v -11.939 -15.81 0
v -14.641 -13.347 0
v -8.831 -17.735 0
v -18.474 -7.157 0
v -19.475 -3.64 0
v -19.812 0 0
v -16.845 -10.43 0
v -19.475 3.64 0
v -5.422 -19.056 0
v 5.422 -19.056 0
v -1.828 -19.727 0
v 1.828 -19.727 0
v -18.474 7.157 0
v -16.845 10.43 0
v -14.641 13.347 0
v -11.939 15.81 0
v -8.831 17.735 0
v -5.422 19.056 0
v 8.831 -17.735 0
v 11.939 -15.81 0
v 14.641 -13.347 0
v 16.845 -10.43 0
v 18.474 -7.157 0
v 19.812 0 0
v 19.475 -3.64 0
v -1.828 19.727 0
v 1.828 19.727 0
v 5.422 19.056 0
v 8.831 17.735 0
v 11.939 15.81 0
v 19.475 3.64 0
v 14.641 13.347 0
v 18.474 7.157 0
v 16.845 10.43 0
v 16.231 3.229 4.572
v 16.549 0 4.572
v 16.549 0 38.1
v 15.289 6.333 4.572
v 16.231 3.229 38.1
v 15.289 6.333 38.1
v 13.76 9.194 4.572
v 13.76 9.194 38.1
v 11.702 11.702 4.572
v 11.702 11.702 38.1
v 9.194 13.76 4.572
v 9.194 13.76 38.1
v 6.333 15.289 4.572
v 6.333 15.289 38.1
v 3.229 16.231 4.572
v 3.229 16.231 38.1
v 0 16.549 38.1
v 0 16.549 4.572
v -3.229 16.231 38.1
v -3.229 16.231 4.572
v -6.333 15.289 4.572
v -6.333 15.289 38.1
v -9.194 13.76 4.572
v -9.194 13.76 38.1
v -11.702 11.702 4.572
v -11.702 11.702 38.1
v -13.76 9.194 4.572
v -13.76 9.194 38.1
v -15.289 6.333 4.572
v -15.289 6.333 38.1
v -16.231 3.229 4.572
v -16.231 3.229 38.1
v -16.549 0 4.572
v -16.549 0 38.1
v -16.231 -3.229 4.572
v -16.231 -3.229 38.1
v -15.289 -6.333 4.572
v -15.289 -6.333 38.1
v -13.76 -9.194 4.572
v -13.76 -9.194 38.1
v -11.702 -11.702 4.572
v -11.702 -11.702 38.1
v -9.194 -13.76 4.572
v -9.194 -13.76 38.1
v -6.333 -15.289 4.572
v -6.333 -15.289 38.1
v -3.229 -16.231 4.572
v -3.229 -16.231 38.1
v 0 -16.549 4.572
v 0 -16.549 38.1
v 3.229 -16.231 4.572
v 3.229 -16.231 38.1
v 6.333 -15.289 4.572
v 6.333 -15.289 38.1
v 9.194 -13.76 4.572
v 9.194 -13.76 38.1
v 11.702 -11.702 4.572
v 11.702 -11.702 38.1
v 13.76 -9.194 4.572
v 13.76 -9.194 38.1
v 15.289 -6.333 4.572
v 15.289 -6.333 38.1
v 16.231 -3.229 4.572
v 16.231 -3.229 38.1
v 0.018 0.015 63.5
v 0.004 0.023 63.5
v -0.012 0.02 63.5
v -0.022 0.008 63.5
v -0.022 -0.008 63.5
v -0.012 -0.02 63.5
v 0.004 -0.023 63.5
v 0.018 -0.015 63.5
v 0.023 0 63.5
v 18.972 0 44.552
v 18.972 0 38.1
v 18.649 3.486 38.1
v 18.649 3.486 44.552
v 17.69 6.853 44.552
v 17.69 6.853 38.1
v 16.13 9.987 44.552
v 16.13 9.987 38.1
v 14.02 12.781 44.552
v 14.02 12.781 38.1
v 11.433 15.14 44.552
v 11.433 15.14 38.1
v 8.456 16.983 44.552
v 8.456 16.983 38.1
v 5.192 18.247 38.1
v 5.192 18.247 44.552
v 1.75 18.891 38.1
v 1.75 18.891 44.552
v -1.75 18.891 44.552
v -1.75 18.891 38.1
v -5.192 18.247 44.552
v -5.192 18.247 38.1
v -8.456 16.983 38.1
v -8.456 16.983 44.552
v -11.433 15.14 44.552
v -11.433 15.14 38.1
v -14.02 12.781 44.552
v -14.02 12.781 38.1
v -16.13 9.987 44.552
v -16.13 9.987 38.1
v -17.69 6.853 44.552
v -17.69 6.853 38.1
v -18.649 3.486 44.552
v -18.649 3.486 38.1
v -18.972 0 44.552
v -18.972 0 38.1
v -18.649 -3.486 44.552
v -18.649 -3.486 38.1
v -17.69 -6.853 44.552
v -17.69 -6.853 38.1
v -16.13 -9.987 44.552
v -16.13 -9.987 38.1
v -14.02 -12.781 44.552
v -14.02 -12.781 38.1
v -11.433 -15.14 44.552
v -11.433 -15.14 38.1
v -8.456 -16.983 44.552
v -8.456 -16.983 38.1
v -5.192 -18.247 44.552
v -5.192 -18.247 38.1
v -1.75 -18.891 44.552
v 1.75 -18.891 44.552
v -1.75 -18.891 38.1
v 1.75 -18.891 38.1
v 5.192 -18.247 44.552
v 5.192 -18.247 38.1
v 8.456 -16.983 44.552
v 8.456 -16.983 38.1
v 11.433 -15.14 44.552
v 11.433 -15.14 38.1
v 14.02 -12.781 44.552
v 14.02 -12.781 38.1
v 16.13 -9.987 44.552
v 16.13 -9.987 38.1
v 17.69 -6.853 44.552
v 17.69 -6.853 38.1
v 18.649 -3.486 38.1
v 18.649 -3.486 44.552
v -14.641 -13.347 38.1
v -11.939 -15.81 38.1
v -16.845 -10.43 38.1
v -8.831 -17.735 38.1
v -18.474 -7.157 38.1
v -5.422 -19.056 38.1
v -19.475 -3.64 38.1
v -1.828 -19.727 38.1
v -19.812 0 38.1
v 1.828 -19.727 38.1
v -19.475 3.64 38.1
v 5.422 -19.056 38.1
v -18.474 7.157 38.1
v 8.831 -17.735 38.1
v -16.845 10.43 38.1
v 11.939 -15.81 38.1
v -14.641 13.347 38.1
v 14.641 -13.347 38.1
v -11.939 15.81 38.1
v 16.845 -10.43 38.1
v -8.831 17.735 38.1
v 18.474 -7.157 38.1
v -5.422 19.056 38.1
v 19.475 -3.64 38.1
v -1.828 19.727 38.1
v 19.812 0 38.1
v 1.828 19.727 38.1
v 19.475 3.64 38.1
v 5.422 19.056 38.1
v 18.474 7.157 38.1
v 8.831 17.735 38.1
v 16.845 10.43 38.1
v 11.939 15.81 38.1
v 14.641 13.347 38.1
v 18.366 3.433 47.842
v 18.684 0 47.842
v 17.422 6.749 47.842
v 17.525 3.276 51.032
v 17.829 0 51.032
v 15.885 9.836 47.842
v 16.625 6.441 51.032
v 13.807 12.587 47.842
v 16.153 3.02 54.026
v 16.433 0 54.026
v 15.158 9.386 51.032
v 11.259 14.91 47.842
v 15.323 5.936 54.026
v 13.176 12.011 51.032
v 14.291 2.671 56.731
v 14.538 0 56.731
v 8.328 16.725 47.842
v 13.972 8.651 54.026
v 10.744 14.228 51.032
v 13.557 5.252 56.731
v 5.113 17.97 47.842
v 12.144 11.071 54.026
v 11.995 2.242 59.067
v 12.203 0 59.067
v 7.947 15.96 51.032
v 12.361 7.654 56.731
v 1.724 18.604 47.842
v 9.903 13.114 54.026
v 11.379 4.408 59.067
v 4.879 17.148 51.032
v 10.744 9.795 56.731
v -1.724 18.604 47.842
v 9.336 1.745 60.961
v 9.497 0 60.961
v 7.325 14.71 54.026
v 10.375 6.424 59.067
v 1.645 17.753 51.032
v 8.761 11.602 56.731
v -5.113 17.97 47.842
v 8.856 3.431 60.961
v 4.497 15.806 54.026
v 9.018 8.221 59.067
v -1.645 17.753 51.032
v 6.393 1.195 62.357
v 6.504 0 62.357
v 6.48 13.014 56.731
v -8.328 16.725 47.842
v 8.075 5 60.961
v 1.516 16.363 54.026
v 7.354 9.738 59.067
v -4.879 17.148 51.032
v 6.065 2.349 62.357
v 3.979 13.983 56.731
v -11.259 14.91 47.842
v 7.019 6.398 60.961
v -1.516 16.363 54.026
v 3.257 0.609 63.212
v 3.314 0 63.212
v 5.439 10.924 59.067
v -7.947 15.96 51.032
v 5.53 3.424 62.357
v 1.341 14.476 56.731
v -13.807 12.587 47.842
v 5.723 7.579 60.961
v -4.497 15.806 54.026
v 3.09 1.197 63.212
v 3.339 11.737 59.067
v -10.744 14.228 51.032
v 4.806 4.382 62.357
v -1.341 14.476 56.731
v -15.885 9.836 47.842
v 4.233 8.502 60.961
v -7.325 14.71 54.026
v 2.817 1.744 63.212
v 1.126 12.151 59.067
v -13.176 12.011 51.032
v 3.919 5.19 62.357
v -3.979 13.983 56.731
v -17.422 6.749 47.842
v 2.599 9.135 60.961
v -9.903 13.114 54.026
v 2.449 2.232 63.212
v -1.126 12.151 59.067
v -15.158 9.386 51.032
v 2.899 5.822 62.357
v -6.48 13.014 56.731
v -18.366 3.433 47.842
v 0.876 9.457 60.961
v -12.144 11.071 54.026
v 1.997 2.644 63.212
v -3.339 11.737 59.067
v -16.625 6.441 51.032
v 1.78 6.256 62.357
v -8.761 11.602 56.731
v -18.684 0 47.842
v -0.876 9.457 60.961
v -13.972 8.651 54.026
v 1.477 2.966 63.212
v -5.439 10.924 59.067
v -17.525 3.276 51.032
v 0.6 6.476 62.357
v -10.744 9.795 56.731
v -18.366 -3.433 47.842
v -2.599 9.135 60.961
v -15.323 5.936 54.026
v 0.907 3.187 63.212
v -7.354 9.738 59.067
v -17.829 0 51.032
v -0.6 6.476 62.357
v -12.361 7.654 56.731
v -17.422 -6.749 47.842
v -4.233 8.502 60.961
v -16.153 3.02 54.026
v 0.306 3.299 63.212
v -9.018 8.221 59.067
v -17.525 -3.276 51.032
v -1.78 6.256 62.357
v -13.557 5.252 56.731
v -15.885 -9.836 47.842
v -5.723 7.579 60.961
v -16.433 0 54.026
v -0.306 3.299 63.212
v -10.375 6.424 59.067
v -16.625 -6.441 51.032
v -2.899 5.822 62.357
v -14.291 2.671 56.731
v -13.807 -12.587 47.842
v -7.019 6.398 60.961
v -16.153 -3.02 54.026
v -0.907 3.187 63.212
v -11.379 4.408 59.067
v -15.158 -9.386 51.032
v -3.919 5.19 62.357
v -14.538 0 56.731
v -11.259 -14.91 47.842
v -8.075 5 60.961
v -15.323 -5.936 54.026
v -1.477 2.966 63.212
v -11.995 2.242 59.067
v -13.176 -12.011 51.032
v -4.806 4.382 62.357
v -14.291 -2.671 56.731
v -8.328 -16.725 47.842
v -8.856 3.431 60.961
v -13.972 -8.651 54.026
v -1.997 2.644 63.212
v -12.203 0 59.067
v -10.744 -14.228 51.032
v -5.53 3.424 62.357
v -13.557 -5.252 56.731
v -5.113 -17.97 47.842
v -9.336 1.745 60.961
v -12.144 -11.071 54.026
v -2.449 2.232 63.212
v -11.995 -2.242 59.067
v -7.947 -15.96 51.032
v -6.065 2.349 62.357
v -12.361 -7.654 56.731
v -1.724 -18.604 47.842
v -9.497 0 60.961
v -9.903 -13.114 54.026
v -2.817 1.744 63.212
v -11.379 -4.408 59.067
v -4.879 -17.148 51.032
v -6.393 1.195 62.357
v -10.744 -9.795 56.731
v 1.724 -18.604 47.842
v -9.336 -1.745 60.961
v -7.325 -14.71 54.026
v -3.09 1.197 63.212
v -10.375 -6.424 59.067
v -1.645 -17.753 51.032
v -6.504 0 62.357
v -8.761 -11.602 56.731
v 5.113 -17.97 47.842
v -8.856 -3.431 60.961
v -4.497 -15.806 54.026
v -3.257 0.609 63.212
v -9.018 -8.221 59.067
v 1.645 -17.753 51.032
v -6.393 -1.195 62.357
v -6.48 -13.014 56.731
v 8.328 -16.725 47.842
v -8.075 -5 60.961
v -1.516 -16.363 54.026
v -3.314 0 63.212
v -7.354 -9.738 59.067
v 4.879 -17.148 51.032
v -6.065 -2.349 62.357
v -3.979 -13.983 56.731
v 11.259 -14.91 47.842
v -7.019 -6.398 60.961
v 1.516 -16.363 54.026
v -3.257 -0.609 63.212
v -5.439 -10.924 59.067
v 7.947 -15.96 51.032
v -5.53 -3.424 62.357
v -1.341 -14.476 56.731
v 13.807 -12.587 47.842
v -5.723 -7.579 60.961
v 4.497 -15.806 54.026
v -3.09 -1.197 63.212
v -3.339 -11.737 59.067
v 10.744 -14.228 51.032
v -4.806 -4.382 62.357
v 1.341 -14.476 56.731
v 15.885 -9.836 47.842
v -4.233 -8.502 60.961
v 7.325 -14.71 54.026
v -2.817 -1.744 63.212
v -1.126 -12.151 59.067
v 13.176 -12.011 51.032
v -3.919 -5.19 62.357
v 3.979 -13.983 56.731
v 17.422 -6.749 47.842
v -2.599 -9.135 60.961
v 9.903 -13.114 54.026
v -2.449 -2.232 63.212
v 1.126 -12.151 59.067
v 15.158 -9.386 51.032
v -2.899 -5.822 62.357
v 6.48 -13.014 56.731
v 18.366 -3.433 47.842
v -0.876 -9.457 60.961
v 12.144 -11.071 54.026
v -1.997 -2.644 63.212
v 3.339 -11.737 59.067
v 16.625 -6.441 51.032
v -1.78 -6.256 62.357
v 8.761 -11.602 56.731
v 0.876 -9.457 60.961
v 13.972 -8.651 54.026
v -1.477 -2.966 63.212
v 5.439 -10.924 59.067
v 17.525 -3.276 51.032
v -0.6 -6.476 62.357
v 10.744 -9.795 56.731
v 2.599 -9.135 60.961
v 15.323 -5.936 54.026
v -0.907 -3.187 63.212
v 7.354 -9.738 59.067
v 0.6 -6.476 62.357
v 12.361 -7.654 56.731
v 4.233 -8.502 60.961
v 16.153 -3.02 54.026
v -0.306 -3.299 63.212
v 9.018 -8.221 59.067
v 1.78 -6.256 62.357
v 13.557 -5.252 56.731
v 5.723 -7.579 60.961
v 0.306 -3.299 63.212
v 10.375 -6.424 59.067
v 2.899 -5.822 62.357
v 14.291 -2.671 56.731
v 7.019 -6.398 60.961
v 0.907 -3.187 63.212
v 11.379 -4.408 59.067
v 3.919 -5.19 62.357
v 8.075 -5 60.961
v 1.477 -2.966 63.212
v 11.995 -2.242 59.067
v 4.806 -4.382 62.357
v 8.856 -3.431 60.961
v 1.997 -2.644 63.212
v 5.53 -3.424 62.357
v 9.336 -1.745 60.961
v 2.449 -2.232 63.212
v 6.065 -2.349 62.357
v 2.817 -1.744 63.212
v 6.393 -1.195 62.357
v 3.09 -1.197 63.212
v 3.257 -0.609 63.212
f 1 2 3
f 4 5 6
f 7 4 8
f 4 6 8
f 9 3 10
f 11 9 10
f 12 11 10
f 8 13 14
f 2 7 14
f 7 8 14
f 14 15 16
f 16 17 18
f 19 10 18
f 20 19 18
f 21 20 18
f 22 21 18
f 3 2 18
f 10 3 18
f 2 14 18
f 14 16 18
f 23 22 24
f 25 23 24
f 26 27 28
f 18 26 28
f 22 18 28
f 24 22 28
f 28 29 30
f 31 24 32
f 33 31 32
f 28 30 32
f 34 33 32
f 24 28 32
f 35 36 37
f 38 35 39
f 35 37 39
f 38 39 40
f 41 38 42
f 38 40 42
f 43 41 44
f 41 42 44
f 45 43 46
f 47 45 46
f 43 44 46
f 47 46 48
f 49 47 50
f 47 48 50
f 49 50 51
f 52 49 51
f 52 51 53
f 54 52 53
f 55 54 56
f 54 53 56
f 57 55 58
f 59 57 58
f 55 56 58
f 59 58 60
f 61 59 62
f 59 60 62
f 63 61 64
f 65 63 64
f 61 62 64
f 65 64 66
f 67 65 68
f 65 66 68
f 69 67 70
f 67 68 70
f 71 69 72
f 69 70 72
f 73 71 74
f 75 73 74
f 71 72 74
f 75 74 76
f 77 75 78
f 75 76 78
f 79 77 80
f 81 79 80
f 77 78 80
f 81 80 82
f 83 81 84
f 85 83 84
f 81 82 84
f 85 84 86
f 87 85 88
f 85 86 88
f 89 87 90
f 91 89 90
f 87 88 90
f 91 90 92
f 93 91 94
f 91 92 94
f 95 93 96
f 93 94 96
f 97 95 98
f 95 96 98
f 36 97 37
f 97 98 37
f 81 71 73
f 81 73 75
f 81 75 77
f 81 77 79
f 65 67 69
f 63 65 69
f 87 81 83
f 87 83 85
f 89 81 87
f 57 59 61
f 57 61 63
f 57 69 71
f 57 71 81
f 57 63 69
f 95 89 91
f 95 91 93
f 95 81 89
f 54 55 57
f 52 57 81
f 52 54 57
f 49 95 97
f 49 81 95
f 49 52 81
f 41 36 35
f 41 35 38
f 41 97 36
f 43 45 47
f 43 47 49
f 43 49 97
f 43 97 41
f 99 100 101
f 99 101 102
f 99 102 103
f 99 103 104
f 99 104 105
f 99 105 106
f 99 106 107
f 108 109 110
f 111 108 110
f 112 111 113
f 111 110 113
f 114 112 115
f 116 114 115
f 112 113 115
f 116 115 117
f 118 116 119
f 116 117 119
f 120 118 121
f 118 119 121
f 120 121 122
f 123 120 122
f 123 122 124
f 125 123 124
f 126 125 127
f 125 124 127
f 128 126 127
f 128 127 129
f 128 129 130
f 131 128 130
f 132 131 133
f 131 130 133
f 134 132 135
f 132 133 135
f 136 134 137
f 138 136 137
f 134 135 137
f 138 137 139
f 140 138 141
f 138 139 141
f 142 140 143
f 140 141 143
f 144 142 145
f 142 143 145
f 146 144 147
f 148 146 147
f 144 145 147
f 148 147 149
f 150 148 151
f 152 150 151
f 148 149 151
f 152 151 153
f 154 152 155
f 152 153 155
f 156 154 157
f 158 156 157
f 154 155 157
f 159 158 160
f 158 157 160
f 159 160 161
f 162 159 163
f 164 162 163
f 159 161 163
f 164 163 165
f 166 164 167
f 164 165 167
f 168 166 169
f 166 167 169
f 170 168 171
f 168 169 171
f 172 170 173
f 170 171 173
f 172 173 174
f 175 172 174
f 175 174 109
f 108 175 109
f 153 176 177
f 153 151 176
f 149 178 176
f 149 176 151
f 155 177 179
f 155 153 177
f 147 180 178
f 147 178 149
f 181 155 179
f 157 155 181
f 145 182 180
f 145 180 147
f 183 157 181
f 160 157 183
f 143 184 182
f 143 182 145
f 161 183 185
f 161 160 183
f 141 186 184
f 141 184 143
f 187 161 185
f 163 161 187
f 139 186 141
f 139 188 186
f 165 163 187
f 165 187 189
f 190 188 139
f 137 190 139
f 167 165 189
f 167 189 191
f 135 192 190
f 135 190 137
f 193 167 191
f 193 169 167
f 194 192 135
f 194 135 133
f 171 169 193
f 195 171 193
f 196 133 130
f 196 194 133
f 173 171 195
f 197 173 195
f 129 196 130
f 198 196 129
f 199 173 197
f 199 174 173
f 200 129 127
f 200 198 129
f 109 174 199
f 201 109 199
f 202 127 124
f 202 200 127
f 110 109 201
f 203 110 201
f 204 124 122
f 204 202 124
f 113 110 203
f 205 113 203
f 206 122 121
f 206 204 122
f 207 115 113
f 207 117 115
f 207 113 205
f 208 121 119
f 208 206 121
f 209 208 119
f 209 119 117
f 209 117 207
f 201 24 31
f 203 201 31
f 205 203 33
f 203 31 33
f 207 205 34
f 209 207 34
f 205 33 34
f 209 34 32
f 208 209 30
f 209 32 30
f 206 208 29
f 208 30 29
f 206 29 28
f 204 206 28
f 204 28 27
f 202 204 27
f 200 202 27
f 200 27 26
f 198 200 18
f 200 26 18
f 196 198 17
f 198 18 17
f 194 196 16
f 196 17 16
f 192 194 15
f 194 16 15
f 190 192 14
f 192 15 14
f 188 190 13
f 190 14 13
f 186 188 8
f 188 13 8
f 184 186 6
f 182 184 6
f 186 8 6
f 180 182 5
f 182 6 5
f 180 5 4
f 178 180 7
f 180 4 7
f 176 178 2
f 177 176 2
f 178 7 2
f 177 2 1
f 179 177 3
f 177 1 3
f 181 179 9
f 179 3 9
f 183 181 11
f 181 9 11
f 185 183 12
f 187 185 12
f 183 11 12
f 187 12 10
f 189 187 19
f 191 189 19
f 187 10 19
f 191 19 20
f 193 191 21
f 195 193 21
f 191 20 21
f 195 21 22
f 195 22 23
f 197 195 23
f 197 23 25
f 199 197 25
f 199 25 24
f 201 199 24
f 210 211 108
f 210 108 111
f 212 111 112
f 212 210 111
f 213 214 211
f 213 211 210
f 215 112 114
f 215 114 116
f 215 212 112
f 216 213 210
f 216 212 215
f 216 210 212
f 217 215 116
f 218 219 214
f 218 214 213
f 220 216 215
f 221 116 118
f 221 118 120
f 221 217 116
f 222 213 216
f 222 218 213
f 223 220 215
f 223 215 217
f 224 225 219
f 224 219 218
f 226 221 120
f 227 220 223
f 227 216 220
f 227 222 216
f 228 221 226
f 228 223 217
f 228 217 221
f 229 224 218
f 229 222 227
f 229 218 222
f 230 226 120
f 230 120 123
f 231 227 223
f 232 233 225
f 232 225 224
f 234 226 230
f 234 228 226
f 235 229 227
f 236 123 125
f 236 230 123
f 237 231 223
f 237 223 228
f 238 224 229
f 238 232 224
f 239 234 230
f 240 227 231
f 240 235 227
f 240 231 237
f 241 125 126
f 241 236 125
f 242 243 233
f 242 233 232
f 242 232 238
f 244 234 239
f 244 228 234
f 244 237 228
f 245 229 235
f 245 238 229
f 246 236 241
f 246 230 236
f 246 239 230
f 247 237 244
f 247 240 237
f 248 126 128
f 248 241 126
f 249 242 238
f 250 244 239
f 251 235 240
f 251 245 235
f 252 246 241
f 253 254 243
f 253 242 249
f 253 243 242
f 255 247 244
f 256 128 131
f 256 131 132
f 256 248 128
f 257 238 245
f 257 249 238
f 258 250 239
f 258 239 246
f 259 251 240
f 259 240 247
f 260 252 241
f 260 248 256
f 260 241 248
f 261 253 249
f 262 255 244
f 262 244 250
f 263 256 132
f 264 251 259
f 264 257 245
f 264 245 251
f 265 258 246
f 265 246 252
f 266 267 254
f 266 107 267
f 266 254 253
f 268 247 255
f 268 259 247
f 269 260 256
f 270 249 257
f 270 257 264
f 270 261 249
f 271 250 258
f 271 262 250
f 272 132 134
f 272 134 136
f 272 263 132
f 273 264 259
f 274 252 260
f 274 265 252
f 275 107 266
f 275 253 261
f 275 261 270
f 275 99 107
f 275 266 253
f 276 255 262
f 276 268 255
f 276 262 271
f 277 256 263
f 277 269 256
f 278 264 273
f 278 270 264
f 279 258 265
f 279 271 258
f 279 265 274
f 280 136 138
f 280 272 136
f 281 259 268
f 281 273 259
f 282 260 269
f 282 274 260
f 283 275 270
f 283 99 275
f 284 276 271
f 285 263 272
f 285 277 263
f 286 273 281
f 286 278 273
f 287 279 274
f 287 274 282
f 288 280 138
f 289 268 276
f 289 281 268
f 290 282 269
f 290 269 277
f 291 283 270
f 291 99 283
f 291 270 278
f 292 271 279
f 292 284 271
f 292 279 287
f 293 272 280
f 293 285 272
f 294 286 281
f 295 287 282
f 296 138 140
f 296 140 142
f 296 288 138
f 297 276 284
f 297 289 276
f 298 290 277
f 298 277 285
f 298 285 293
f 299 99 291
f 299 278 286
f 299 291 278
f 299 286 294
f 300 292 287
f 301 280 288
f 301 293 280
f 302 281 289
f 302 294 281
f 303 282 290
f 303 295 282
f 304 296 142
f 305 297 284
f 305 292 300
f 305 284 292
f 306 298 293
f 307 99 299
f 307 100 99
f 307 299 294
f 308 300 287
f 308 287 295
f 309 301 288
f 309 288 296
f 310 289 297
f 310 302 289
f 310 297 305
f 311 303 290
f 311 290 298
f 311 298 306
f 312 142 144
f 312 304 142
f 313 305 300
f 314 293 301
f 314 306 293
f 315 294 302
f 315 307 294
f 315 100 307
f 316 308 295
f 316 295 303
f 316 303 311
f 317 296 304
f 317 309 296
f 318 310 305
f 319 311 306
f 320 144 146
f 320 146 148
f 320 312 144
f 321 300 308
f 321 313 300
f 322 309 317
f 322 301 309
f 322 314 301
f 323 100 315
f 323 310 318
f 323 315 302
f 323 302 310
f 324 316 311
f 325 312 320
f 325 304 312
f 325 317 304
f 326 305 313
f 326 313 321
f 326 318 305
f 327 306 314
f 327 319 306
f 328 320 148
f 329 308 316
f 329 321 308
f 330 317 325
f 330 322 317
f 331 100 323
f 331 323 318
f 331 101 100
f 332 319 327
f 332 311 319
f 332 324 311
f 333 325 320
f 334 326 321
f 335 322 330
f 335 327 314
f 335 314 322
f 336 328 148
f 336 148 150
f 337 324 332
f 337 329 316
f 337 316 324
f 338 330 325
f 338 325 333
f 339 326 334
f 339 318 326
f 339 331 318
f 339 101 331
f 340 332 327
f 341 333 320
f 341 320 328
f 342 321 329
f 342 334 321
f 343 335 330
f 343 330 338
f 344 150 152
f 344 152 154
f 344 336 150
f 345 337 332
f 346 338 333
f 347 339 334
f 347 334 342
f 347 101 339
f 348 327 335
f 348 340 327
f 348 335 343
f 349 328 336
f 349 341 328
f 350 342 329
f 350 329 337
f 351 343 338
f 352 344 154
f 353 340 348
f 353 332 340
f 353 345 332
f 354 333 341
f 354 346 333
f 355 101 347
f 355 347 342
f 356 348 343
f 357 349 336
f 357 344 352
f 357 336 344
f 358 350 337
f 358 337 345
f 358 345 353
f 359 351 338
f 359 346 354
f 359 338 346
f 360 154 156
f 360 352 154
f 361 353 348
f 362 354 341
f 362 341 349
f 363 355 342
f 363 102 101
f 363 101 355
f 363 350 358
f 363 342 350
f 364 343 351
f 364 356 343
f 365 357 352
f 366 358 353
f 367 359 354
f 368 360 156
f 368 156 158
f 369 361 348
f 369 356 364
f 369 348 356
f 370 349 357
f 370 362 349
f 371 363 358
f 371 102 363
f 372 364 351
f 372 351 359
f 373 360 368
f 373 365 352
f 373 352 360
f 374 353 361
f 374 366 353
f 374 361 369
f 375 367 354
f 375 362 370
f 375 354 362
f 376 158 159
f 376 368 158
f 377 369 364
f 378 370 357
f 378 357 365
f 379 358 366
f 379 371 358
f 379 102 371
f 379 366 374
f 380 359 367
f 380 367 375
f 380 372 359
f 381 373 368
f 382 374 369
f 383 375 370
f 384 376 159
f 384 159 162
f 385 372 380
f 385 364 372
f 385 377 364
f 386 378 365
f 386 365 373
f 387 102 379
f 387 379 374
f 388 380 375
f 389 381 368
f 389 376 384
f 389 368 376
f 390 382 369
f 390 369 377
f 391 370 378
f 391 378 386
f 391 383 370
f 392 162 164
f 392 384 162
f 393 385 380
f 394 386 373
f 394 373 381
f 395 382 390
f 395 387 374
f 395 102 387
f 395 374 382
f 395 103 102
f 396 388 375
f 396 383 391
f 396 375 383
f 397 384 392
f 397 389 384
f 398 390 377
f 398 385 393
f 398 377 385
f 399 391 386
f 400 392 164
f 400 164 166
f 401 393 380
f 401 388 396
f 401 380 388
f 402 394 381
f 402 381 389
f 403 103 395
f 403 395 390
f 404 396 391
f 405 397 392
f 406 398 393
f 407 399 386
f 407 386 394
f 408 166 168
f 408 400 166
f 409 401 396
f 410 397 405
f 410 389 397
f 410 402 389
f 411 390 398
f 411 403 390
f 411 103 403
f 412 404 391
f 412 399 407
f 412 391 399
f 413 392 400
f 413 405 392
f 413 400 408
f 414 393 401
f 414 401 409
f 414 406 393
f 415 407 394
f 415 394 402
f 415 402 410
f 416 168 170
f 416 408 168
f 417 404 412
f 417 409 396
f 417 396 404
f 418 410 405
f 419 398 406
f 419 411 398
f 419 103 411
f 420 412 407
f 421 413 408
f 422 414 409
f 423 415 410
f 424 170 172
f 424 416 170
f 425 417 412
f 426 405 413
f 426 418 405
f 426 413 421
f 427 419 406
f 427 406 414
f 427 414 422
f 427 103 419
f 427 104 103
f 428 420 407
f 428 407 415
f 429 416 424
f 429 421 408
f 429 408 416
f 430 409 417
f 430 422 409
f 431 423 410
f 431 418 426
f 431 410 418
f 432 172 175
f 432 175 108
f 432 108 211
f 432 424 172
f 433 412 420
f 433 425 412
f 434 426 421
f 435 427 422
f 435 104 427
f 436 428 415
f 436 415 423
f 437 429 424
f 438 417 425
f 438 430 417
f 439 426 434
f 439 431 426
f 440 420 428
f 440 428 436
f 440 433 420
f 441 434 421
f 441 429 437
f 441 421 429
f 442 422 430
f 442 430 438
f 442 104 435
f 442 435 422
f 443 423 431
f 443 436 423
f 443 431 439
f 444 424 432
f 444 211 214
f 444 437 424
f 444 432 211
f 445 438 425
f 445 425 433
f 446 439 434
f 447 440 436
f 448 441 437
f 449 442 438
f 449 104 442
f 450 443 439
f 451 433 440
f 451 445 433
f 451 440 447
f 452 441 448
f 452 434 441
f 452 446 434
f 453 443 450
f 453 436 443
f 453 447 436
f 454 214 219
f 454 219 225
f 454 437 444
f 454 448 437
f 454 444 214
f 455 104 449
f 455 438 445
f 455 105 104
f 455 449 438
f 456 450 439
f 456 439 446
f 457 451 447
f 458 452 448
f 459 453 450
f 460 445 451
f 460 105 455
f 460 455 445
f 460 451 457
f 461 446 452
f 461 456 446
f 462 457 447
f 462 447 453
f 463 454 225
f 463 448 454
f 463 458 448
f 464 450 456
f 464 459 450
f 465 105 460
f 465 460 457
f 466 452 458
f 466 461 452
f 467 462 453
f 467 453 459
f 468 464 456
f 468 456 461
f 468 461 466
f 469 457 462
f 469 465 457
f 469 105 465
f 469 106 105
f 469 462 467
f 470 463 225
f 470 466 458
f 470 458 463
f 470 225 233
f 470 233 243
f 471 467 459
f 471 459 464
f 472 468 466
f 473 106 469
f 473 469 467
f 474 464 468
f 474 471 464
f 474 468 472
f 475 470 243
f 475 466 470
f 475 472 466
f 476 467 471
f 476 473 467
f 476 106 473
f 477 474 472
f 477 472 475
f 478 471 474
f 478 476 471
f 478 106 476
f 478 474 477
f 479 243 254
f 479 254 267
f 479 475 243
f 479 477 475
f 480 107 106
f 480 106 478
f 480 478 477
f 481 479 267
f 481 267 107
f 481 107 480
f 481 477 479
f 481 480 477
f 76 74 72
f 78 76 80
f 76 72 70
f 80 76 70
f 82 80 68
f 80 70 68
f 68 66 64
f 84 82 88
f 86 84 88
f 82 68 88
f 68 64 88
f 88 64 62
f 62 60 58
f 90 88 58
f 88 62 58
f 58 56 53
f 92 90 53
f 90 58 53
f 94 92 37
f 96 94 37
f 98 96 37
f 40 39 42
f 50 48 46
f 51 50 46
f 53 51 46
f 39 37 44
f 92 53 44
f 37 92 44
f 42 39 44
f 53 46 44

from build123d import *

# Parameters (mm, degrees)
F0_R     = 19.812
F1_DEPTH = 38.1
F2_R     = 16.548802
F3_DEPTH = 33.528
F4_R     = 18.971562
F5_DEPTH = 25.4
F6_R     = 18.9484


with BuildPart() as f1:
    # F0 (on Top) → F1 (new body)
    with BuildSketch(Plane.XY):
        Circle(F0_R)
    extrude(amount=F1_DEPTH)

    # F2 (on face) → F3 (cut)
    with BuildSketch(Plane.XY.offset(38.1)):
        Circle(F2_R)
    extrude(amount=-F3_DEPTH, mode=Mode.SUBTRACT)

    # F4 (on face) → F5 (join)
    with BuildSketch(Plane.XY.offset(38.1)):
        Circle(F4_R)
    extrude(amount=F5_DEPTH)

    # F6
    f6_edges = [f1.edges().sort_by_distance(p)[0] for p in [
        (-18.971562, 0, 63.5),
    ]]
    fillet(f6_edges, radius=F6_R)


solid = f1.part
